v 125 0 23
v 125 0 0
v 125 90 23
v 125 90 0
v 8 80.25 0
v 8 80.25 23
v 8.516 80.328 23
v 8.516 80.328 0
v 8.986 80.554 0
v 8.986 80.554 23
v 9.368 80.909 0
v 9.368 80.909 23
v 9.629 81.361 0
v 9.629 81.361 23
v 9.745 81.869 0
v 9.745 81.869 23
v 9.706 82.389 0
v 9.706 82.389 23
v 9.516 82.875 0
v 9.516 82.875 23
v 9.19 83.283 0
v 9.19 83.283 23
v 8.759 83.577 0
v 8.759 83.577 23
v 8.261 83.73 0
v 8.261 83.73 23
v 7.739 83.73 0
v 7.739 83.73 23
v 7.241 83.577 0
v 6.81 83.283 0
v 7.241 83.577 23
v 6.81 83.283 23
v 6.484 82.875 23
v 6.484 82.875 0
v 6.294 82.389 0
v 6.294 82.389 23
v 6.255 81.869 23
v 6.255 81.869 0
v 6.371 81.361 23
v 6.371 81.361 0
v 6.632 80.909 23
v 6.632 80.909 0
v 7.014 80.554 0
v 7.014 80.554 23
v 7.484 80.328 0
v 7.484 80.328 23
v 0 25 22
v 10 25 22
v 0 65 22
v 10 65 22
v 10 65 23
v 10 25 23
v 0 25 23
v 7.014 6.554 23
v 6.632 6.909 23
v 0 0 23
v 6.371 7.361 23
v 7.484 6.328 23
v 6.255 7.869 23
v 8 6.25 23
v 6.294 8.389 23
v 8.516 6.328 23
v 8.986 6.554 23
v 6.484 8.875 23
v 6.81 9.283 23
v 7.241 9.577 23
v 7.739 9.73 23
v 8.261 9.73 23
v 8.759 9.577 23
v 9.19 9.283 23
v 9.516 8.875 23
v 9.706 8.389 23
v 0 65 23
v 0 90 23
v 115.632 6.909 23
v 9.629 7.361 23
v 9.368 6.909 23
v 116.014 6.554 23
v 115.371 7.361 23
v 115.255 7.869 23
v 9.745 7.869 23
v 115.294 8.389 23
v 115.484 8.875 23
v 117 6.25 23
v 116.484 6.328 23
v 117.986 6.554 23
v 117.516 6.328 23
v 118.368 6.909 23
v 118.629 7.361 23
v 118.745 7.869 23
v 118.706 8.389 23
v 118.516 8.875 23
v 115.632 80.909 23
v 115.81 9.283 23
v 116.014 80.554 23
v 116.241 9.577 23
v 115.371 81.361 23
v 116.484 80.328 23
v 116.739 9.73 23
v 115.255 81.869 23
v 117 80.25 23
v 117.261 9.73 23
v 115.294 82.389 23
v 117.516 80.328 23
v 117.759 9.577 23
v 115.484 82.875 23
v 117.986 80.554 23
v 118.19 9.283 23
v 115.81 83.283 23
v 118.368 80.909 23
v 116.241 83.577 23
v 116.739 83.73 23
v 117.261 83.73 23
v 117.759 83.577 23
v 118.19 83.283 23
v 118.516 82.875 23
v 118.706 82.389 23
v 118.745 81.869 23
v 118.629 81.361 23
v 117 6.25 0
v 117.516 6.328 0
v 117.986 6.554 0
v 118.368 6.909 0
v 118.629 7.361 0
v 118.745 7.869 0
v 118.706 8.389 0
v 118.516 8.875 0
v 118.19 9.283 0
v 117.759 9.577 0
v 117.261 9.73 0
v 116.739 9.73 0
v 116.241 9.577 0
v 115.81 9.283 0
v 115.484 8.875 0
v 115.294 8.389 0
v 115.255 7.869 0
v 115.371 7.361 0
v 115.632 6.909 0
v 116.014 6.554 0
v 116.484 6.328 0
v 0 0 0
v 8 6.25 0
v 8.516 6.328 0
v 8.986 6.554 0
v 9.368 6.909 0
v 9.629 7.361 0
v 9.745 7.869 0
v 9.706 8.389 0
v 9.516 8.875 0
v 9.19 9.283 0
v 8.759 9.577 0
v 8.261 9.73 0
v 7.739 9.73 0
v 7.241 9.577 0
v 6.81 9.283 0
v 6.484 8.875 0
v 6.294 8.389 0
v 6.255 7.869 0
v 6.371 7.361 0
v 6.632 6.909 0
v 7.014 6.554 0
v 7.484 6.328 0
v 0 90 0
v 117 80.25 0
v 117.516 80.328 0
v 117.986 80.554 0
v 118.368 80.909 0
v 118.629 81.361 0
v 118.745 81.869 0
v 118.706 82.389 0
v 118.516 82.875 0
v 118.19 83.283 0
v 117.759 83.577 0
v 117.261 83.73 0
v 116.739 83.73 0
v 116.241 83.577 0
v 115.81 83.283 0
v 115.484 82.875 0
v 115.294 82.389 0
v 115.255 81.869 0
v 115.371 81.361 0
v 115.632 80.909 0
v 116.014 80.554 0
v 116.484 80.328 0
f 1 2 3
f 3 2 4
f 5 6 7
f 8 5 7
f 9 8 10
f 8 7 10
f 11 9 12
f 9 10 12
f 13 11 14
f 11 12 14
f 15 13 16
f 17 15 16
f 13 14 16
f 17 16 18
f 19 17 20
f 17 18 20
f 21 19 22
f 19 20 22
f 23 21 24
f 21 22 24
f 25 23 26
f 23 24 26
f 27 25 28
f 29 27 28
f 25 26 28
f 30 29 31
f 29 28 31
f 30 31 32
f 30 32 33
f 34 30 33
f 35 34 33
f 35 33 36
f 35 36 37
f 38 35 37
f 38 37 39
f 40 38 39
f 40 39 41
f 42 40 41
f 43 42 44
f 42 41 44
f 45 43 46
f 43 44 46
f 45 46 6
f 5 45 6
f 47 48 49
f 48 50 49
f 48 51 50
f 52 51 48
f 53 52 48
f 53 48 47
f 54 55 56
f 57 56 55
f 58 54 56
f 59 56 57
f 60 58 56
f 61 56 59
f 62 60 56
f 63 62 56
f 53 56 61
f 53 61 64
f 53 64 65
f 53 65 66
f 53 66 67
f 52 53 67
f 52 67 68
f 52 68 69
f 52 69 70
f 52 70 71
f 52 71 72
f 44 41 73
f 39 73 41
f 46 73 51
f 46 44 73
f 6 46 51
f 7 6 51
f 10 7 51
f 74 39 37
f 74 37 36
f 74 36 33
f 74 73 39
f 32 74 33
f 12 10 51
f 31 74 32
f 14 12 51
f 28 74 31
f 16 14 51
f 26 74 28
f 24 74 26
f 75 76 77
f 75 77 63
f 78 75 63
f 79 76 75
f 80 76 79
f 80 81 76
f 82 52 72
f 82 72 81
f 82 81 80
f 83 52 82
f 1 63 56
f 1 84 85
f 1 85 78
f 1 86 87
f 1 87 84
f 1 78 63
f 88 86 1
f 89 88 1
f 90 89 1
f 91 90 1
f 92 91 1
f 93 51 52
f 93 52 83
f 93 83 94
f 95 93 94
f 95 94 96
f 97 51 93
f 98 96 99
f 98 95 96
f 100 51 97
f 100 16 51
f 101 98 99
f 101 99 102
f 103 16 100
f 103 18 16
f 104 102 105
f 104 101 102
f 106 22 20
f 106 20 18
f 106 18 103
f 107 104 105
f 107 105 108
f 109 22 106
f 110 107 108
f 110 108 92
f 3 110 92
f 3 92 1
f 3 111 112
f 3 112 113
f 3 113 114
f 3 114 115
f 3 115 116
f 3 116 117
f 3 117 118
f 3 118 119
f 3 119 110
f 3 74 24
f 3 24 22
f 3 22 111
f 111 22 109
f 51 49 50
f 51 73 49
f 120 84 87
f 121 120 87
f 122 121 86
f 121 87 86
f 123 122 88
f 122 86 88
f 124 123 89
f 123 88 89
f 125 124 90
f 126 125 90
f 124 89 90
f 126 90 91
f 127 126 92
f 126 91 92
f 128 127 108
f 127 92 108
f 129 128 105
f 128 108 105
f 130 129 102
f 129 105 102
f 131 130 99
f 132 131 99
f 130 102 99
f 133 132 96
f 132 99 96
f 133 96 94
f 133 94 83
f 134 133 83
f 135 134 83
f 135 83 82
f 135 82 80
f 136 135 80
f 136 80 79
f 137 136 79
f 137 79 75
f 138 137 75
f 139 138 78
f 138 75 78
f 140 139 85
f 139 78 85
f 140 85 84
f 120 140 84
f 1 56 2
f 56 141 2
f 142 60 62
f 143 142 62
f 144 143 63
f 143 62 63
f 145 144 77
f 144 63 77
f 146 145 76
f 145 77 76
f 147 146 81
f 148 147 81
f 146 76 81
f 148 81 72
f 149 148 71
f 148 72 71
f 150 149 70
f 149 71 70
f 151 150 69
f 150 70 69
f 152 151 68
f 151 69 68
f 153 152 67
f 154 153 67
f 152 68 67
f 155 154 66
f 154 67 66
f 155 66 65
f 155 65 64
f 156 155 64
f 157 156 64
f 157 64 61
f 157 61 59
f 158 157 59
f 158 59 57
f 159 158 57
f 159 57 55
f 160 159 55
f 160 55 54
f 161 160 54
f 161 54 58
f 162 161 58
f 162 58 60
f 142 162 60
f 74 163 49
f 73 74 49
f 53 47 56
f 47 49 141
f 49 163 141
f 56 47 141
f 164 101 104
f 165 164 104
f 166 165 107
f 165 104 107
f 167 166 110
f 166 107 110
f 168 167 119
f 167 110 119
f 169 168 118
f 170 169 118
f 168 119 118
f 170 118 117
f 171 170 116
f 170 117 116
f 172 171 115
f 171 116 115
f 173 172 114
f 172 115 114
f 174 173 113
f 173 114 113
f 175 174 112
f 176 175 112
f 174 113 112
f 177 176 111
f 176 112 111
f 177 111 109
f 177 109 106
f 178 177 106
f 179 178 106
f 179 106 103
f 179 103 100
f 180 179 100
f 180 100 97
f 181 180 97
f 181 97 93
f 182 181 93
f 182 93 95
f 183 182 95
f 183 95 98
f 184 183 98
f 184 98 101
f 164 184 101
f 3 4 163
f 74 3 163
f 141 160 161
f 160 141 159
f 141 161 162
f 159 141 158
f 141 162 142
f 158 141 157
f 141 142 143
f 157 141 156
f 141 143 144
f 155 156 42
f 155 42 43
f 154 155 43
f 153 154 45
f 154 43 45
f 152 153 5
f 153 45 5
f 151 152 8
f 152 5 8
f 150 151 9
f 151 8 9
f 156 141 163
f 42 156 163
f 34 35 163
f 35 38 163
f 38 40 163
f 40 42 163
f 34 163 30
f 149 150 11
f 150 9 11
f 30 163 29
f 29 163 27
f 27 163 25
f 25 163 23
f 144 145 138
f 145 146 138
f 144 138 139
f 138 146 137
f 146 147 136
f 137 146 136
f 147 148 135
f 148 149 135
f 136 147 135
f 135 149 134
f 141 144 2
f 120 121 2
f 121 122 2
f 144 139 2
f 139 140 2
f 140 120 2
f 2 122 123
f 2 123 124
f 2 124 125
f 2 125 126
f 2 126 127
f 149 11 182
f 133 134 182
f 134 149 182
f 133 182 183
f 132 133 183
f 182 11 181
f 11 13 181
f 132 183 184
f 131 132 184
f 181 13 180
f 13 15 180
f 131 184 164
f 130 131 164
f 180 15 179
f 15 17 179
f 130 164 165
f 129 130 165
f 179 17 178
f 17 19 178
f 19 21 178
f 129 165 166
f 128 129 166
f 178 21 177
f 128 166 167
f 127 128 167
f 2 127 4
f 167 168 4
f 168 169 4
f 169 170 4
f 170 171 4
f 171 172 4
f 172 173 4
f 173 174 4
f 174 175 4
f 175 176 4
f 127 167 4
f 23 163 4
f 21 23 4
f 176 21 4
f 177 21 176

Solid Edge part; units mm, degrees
sketch "Sketch1" plane through (0, 0, 0) normal (0, 0, 1) x (1, 0, 0)
  line L0 (0, 0) -> (125, 0)
  line L1 (125, 0) -> (125, 90)
  line L2 (125, 90) -> (0, 90)
  line L3 (0, 90) -> (0, 0)
  dimension "D1" = 125
  dimension "D2" = 90
extrude "Protrusion1" add sketch "Sketch1" along normal blind 23
hole "Bohrung_1" at (8, 82, 23) direction (0, 0, -1) diameter 3.5 end through all
hole "Hole1" at (117, 82, 23) direction (0, 0, -1) diameter 3.5 end through all
hole "Hole2" at (8, 8, 23) direction (0, 0, -1) diameter 3.5 end through all
hole "Hole3" at (117, 8, 23) direction (0, 0, -1) diameter 3.5 end through all
sketch "Sketch2" plane through (62.5, 45, 23) normal (0, 0, 1) x (1, 0, 0)
  line L0 (-62.5, 20) -> (-52.5, 20)
  line L1 (-52.5, 20) -> (-52.5, -20)
  line L2 (-52.5, -20) -> (-62.5, -20)
  line L3 (-62.5, -20) -> (-62.5, 20)
  dimension "D1" = 10
  dimension "D2" = 40
extrude "Cutout1" cut sketch "Sketch2" against normal blind 1
properties material "Elektronik"
